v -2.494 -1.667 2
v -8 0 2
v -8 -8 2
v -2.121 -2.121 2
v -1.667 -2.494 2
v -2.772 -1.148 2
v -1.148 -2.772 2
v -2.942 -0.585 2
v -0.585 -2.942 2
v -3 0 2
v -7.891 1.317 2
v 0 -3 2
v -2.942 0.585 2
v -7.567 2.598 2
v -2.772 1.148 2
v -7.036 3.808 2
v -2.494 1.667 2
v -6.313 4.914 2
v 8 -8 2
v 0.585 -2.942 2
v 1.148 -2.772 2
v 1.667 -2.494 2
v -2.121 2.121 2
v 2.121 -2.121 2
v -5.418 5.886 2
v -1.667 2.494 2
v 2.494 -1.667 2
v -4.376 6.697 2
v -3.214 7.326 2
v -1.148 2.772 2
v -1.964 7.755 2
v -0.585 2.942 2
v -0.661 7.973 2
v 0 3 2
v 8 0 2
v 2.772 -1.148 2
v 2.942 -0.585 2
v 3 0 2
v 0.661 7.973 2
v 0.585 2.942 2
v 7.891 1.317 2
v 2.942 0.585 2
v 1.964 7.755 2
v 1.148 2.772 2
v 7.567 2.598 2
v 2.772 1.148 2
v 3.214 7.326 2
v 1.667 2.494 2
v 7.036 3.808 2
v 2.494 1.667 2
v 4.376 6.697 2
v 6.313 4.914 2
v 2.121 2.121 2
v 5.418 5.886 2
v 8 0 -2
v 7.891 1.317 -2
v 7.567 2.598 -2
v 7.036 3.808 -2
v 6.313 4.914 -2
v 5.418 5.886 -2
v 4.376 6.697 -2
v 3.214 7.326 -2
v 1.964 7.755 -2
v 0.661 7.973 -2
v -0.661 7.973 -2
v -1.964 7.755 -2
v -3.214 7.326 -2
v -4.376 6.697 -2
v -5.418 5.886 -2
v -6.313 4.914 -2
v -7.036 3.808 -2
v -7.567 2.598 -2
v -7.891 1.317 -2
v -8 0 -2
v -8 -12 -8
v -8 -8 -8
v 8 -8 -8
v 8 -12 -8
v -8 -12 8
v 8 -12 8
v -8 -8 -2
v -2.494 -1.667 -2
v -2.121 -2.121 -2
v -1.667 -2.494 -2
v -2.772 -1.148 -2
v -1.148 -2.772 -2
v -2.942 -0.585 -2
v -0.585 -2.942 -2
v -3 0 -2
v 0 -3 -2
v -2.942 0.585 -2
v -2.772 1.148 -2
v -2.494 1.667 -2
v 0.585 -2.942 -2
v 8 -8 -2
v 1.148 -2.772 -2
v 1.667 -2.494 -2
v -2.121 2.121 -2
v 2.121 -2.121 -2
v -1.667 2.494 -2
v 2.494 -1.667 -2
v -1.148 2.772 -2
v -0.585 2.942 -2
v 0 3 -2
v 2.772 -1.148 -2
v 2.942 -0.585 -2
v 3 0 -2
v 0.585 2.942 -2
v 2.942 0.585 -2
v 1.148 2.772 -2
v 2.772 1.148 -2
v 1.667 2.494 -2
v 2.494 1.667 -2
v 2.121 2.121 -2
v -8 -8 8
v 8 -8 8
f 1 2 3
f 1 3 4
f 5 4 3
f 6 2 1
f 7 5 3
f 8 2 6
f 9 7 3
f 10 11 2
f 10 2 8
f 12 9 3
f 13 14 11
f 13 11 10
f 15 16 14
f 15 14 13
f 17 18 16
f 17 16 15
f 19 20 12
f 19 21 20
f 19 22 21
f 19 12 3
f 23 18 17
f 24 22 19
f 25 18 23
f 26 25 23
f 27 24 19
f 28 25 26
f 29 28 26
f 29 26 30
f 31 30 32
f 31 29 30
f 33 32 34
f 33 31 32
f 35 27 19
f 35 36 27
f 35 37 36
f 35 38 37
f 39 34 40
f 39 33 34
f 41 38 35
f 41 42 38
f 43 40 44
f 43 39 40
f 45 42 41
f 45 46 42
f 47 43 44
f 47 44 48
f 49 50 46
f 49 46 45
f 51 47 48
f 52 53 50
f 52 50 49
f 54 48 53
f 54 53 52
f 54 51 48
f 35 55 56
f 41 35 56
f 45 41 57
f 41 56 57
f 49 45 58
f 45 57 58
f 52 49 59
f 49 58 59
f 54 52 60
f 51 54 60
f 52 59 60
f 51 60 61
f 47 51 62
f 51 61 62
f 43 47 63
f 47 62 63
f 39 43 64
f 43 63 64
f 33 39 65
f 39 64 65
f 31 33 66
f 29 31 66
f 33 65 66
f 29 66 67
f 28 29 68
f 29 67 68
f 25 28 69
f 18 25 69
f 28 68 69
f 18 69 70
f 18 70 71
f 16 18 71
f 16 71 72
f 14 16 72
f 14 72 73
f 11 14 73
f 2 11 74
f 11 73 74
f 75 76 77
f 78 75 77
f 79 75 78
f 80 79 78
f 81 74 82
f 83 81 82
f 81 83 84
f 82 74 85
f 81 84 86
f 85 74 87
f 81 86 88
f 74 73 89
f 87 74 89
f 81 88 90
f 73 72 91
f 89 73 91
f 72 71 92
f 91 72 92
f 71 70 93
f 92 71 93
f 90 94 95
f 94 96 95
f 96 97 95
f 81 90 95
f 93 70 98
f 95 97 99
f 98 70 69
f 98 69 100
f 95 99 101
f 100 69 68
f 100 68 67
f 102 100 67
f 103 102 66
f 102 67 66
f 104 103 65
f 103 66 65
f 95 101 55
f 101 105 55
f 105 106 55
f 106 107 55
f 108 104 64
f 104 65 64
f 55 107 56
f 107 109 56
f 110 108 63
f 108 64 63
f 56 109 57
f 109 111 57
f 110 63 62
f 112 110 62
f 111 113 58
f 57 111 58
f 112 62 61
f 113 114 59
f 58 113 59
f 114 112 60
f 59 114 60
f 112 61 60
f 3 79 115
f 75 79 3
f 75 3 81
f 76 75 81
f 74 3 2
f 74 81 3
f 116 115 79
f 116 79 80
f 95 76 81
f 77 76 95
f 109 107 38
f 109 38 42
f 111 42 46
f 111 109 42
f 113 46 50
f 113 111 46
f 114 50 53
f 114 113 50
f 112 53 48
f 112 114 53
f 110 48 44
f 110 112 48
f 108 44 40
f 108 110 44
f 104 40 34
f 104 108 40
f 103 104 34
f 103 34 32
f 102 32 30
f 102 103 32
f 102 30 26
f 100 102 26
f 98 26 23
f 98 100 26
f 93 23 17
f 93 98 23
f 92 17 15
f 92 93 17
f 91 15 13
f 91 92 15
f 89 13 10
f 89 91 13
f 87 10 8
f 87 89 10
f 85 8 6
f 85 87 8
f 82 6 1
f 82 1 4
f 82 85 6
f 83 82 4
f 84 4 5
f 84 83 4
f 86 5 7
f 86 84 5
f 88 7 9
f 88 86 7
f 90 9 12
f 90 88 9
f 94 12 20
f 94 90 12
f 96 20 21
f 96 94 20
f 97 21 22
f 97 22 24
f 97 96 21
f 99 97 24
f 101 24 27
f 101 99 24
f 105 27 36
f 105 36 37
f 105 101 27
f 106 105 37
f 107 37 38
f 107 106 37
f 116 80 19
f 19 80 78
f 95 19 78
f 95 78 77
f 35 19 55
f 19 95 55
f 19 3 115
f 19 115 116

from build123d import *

# Parameters (mm, degrees)
BOSS_EXTRUDE1_DEPTH      = 2
BOSS_EXTRUDE1_DEPTH_BACK = 2
SKETCH1_R                = 3
BOSS_EXTRUDE2_DEPTH      = 8
BOSS_EXTRUDE2_DEPTH_BACK = 8
SKETCH2_W                = 16
SKETCH2_H                = 4


with BuildPart() as part:
    # Sketch1 → Boss-Extrude1 (new, two sides: drawn at the far end of the back side and taken through both)
    with BuildSketch(Plane.XY.offset(-BOSS_EXTRUDE1_DEPTH_BACK)):
        with BuildLine():
            Line((-8, 0), (-8, -12))
            Line((-8, -12), (8, -12))
            Line((8, -12), (8, 0))
            ThreePointArc((8, 0), (0, 8), (-8, 0))
        make_face()
        Circle(SKETCH1_R, mode=Mode.SUBTRACT)
    extrude(amount=BOSS_EXTRUDE1_DEPTH + BOSS_EXTRUDE1_DEPTH_BACK)

    # Sketch2 → Boss-Extrude2 (add, two sides: drawn at the far end of the back side and taken through both)
    with BuildSketch(Plane.XY.offset(-BOSS_EXTRUDE2_DEPTH_BACK)):
        with Locations((0, -10)):
            Rectangle(SKETCH2_W, SKETCH2_H)
    extrude(amount=BOSS_EXTRUDE2_DEPTH + BOSS_EXTRUDE2_DEPTH_BACK)


solid = part.part
